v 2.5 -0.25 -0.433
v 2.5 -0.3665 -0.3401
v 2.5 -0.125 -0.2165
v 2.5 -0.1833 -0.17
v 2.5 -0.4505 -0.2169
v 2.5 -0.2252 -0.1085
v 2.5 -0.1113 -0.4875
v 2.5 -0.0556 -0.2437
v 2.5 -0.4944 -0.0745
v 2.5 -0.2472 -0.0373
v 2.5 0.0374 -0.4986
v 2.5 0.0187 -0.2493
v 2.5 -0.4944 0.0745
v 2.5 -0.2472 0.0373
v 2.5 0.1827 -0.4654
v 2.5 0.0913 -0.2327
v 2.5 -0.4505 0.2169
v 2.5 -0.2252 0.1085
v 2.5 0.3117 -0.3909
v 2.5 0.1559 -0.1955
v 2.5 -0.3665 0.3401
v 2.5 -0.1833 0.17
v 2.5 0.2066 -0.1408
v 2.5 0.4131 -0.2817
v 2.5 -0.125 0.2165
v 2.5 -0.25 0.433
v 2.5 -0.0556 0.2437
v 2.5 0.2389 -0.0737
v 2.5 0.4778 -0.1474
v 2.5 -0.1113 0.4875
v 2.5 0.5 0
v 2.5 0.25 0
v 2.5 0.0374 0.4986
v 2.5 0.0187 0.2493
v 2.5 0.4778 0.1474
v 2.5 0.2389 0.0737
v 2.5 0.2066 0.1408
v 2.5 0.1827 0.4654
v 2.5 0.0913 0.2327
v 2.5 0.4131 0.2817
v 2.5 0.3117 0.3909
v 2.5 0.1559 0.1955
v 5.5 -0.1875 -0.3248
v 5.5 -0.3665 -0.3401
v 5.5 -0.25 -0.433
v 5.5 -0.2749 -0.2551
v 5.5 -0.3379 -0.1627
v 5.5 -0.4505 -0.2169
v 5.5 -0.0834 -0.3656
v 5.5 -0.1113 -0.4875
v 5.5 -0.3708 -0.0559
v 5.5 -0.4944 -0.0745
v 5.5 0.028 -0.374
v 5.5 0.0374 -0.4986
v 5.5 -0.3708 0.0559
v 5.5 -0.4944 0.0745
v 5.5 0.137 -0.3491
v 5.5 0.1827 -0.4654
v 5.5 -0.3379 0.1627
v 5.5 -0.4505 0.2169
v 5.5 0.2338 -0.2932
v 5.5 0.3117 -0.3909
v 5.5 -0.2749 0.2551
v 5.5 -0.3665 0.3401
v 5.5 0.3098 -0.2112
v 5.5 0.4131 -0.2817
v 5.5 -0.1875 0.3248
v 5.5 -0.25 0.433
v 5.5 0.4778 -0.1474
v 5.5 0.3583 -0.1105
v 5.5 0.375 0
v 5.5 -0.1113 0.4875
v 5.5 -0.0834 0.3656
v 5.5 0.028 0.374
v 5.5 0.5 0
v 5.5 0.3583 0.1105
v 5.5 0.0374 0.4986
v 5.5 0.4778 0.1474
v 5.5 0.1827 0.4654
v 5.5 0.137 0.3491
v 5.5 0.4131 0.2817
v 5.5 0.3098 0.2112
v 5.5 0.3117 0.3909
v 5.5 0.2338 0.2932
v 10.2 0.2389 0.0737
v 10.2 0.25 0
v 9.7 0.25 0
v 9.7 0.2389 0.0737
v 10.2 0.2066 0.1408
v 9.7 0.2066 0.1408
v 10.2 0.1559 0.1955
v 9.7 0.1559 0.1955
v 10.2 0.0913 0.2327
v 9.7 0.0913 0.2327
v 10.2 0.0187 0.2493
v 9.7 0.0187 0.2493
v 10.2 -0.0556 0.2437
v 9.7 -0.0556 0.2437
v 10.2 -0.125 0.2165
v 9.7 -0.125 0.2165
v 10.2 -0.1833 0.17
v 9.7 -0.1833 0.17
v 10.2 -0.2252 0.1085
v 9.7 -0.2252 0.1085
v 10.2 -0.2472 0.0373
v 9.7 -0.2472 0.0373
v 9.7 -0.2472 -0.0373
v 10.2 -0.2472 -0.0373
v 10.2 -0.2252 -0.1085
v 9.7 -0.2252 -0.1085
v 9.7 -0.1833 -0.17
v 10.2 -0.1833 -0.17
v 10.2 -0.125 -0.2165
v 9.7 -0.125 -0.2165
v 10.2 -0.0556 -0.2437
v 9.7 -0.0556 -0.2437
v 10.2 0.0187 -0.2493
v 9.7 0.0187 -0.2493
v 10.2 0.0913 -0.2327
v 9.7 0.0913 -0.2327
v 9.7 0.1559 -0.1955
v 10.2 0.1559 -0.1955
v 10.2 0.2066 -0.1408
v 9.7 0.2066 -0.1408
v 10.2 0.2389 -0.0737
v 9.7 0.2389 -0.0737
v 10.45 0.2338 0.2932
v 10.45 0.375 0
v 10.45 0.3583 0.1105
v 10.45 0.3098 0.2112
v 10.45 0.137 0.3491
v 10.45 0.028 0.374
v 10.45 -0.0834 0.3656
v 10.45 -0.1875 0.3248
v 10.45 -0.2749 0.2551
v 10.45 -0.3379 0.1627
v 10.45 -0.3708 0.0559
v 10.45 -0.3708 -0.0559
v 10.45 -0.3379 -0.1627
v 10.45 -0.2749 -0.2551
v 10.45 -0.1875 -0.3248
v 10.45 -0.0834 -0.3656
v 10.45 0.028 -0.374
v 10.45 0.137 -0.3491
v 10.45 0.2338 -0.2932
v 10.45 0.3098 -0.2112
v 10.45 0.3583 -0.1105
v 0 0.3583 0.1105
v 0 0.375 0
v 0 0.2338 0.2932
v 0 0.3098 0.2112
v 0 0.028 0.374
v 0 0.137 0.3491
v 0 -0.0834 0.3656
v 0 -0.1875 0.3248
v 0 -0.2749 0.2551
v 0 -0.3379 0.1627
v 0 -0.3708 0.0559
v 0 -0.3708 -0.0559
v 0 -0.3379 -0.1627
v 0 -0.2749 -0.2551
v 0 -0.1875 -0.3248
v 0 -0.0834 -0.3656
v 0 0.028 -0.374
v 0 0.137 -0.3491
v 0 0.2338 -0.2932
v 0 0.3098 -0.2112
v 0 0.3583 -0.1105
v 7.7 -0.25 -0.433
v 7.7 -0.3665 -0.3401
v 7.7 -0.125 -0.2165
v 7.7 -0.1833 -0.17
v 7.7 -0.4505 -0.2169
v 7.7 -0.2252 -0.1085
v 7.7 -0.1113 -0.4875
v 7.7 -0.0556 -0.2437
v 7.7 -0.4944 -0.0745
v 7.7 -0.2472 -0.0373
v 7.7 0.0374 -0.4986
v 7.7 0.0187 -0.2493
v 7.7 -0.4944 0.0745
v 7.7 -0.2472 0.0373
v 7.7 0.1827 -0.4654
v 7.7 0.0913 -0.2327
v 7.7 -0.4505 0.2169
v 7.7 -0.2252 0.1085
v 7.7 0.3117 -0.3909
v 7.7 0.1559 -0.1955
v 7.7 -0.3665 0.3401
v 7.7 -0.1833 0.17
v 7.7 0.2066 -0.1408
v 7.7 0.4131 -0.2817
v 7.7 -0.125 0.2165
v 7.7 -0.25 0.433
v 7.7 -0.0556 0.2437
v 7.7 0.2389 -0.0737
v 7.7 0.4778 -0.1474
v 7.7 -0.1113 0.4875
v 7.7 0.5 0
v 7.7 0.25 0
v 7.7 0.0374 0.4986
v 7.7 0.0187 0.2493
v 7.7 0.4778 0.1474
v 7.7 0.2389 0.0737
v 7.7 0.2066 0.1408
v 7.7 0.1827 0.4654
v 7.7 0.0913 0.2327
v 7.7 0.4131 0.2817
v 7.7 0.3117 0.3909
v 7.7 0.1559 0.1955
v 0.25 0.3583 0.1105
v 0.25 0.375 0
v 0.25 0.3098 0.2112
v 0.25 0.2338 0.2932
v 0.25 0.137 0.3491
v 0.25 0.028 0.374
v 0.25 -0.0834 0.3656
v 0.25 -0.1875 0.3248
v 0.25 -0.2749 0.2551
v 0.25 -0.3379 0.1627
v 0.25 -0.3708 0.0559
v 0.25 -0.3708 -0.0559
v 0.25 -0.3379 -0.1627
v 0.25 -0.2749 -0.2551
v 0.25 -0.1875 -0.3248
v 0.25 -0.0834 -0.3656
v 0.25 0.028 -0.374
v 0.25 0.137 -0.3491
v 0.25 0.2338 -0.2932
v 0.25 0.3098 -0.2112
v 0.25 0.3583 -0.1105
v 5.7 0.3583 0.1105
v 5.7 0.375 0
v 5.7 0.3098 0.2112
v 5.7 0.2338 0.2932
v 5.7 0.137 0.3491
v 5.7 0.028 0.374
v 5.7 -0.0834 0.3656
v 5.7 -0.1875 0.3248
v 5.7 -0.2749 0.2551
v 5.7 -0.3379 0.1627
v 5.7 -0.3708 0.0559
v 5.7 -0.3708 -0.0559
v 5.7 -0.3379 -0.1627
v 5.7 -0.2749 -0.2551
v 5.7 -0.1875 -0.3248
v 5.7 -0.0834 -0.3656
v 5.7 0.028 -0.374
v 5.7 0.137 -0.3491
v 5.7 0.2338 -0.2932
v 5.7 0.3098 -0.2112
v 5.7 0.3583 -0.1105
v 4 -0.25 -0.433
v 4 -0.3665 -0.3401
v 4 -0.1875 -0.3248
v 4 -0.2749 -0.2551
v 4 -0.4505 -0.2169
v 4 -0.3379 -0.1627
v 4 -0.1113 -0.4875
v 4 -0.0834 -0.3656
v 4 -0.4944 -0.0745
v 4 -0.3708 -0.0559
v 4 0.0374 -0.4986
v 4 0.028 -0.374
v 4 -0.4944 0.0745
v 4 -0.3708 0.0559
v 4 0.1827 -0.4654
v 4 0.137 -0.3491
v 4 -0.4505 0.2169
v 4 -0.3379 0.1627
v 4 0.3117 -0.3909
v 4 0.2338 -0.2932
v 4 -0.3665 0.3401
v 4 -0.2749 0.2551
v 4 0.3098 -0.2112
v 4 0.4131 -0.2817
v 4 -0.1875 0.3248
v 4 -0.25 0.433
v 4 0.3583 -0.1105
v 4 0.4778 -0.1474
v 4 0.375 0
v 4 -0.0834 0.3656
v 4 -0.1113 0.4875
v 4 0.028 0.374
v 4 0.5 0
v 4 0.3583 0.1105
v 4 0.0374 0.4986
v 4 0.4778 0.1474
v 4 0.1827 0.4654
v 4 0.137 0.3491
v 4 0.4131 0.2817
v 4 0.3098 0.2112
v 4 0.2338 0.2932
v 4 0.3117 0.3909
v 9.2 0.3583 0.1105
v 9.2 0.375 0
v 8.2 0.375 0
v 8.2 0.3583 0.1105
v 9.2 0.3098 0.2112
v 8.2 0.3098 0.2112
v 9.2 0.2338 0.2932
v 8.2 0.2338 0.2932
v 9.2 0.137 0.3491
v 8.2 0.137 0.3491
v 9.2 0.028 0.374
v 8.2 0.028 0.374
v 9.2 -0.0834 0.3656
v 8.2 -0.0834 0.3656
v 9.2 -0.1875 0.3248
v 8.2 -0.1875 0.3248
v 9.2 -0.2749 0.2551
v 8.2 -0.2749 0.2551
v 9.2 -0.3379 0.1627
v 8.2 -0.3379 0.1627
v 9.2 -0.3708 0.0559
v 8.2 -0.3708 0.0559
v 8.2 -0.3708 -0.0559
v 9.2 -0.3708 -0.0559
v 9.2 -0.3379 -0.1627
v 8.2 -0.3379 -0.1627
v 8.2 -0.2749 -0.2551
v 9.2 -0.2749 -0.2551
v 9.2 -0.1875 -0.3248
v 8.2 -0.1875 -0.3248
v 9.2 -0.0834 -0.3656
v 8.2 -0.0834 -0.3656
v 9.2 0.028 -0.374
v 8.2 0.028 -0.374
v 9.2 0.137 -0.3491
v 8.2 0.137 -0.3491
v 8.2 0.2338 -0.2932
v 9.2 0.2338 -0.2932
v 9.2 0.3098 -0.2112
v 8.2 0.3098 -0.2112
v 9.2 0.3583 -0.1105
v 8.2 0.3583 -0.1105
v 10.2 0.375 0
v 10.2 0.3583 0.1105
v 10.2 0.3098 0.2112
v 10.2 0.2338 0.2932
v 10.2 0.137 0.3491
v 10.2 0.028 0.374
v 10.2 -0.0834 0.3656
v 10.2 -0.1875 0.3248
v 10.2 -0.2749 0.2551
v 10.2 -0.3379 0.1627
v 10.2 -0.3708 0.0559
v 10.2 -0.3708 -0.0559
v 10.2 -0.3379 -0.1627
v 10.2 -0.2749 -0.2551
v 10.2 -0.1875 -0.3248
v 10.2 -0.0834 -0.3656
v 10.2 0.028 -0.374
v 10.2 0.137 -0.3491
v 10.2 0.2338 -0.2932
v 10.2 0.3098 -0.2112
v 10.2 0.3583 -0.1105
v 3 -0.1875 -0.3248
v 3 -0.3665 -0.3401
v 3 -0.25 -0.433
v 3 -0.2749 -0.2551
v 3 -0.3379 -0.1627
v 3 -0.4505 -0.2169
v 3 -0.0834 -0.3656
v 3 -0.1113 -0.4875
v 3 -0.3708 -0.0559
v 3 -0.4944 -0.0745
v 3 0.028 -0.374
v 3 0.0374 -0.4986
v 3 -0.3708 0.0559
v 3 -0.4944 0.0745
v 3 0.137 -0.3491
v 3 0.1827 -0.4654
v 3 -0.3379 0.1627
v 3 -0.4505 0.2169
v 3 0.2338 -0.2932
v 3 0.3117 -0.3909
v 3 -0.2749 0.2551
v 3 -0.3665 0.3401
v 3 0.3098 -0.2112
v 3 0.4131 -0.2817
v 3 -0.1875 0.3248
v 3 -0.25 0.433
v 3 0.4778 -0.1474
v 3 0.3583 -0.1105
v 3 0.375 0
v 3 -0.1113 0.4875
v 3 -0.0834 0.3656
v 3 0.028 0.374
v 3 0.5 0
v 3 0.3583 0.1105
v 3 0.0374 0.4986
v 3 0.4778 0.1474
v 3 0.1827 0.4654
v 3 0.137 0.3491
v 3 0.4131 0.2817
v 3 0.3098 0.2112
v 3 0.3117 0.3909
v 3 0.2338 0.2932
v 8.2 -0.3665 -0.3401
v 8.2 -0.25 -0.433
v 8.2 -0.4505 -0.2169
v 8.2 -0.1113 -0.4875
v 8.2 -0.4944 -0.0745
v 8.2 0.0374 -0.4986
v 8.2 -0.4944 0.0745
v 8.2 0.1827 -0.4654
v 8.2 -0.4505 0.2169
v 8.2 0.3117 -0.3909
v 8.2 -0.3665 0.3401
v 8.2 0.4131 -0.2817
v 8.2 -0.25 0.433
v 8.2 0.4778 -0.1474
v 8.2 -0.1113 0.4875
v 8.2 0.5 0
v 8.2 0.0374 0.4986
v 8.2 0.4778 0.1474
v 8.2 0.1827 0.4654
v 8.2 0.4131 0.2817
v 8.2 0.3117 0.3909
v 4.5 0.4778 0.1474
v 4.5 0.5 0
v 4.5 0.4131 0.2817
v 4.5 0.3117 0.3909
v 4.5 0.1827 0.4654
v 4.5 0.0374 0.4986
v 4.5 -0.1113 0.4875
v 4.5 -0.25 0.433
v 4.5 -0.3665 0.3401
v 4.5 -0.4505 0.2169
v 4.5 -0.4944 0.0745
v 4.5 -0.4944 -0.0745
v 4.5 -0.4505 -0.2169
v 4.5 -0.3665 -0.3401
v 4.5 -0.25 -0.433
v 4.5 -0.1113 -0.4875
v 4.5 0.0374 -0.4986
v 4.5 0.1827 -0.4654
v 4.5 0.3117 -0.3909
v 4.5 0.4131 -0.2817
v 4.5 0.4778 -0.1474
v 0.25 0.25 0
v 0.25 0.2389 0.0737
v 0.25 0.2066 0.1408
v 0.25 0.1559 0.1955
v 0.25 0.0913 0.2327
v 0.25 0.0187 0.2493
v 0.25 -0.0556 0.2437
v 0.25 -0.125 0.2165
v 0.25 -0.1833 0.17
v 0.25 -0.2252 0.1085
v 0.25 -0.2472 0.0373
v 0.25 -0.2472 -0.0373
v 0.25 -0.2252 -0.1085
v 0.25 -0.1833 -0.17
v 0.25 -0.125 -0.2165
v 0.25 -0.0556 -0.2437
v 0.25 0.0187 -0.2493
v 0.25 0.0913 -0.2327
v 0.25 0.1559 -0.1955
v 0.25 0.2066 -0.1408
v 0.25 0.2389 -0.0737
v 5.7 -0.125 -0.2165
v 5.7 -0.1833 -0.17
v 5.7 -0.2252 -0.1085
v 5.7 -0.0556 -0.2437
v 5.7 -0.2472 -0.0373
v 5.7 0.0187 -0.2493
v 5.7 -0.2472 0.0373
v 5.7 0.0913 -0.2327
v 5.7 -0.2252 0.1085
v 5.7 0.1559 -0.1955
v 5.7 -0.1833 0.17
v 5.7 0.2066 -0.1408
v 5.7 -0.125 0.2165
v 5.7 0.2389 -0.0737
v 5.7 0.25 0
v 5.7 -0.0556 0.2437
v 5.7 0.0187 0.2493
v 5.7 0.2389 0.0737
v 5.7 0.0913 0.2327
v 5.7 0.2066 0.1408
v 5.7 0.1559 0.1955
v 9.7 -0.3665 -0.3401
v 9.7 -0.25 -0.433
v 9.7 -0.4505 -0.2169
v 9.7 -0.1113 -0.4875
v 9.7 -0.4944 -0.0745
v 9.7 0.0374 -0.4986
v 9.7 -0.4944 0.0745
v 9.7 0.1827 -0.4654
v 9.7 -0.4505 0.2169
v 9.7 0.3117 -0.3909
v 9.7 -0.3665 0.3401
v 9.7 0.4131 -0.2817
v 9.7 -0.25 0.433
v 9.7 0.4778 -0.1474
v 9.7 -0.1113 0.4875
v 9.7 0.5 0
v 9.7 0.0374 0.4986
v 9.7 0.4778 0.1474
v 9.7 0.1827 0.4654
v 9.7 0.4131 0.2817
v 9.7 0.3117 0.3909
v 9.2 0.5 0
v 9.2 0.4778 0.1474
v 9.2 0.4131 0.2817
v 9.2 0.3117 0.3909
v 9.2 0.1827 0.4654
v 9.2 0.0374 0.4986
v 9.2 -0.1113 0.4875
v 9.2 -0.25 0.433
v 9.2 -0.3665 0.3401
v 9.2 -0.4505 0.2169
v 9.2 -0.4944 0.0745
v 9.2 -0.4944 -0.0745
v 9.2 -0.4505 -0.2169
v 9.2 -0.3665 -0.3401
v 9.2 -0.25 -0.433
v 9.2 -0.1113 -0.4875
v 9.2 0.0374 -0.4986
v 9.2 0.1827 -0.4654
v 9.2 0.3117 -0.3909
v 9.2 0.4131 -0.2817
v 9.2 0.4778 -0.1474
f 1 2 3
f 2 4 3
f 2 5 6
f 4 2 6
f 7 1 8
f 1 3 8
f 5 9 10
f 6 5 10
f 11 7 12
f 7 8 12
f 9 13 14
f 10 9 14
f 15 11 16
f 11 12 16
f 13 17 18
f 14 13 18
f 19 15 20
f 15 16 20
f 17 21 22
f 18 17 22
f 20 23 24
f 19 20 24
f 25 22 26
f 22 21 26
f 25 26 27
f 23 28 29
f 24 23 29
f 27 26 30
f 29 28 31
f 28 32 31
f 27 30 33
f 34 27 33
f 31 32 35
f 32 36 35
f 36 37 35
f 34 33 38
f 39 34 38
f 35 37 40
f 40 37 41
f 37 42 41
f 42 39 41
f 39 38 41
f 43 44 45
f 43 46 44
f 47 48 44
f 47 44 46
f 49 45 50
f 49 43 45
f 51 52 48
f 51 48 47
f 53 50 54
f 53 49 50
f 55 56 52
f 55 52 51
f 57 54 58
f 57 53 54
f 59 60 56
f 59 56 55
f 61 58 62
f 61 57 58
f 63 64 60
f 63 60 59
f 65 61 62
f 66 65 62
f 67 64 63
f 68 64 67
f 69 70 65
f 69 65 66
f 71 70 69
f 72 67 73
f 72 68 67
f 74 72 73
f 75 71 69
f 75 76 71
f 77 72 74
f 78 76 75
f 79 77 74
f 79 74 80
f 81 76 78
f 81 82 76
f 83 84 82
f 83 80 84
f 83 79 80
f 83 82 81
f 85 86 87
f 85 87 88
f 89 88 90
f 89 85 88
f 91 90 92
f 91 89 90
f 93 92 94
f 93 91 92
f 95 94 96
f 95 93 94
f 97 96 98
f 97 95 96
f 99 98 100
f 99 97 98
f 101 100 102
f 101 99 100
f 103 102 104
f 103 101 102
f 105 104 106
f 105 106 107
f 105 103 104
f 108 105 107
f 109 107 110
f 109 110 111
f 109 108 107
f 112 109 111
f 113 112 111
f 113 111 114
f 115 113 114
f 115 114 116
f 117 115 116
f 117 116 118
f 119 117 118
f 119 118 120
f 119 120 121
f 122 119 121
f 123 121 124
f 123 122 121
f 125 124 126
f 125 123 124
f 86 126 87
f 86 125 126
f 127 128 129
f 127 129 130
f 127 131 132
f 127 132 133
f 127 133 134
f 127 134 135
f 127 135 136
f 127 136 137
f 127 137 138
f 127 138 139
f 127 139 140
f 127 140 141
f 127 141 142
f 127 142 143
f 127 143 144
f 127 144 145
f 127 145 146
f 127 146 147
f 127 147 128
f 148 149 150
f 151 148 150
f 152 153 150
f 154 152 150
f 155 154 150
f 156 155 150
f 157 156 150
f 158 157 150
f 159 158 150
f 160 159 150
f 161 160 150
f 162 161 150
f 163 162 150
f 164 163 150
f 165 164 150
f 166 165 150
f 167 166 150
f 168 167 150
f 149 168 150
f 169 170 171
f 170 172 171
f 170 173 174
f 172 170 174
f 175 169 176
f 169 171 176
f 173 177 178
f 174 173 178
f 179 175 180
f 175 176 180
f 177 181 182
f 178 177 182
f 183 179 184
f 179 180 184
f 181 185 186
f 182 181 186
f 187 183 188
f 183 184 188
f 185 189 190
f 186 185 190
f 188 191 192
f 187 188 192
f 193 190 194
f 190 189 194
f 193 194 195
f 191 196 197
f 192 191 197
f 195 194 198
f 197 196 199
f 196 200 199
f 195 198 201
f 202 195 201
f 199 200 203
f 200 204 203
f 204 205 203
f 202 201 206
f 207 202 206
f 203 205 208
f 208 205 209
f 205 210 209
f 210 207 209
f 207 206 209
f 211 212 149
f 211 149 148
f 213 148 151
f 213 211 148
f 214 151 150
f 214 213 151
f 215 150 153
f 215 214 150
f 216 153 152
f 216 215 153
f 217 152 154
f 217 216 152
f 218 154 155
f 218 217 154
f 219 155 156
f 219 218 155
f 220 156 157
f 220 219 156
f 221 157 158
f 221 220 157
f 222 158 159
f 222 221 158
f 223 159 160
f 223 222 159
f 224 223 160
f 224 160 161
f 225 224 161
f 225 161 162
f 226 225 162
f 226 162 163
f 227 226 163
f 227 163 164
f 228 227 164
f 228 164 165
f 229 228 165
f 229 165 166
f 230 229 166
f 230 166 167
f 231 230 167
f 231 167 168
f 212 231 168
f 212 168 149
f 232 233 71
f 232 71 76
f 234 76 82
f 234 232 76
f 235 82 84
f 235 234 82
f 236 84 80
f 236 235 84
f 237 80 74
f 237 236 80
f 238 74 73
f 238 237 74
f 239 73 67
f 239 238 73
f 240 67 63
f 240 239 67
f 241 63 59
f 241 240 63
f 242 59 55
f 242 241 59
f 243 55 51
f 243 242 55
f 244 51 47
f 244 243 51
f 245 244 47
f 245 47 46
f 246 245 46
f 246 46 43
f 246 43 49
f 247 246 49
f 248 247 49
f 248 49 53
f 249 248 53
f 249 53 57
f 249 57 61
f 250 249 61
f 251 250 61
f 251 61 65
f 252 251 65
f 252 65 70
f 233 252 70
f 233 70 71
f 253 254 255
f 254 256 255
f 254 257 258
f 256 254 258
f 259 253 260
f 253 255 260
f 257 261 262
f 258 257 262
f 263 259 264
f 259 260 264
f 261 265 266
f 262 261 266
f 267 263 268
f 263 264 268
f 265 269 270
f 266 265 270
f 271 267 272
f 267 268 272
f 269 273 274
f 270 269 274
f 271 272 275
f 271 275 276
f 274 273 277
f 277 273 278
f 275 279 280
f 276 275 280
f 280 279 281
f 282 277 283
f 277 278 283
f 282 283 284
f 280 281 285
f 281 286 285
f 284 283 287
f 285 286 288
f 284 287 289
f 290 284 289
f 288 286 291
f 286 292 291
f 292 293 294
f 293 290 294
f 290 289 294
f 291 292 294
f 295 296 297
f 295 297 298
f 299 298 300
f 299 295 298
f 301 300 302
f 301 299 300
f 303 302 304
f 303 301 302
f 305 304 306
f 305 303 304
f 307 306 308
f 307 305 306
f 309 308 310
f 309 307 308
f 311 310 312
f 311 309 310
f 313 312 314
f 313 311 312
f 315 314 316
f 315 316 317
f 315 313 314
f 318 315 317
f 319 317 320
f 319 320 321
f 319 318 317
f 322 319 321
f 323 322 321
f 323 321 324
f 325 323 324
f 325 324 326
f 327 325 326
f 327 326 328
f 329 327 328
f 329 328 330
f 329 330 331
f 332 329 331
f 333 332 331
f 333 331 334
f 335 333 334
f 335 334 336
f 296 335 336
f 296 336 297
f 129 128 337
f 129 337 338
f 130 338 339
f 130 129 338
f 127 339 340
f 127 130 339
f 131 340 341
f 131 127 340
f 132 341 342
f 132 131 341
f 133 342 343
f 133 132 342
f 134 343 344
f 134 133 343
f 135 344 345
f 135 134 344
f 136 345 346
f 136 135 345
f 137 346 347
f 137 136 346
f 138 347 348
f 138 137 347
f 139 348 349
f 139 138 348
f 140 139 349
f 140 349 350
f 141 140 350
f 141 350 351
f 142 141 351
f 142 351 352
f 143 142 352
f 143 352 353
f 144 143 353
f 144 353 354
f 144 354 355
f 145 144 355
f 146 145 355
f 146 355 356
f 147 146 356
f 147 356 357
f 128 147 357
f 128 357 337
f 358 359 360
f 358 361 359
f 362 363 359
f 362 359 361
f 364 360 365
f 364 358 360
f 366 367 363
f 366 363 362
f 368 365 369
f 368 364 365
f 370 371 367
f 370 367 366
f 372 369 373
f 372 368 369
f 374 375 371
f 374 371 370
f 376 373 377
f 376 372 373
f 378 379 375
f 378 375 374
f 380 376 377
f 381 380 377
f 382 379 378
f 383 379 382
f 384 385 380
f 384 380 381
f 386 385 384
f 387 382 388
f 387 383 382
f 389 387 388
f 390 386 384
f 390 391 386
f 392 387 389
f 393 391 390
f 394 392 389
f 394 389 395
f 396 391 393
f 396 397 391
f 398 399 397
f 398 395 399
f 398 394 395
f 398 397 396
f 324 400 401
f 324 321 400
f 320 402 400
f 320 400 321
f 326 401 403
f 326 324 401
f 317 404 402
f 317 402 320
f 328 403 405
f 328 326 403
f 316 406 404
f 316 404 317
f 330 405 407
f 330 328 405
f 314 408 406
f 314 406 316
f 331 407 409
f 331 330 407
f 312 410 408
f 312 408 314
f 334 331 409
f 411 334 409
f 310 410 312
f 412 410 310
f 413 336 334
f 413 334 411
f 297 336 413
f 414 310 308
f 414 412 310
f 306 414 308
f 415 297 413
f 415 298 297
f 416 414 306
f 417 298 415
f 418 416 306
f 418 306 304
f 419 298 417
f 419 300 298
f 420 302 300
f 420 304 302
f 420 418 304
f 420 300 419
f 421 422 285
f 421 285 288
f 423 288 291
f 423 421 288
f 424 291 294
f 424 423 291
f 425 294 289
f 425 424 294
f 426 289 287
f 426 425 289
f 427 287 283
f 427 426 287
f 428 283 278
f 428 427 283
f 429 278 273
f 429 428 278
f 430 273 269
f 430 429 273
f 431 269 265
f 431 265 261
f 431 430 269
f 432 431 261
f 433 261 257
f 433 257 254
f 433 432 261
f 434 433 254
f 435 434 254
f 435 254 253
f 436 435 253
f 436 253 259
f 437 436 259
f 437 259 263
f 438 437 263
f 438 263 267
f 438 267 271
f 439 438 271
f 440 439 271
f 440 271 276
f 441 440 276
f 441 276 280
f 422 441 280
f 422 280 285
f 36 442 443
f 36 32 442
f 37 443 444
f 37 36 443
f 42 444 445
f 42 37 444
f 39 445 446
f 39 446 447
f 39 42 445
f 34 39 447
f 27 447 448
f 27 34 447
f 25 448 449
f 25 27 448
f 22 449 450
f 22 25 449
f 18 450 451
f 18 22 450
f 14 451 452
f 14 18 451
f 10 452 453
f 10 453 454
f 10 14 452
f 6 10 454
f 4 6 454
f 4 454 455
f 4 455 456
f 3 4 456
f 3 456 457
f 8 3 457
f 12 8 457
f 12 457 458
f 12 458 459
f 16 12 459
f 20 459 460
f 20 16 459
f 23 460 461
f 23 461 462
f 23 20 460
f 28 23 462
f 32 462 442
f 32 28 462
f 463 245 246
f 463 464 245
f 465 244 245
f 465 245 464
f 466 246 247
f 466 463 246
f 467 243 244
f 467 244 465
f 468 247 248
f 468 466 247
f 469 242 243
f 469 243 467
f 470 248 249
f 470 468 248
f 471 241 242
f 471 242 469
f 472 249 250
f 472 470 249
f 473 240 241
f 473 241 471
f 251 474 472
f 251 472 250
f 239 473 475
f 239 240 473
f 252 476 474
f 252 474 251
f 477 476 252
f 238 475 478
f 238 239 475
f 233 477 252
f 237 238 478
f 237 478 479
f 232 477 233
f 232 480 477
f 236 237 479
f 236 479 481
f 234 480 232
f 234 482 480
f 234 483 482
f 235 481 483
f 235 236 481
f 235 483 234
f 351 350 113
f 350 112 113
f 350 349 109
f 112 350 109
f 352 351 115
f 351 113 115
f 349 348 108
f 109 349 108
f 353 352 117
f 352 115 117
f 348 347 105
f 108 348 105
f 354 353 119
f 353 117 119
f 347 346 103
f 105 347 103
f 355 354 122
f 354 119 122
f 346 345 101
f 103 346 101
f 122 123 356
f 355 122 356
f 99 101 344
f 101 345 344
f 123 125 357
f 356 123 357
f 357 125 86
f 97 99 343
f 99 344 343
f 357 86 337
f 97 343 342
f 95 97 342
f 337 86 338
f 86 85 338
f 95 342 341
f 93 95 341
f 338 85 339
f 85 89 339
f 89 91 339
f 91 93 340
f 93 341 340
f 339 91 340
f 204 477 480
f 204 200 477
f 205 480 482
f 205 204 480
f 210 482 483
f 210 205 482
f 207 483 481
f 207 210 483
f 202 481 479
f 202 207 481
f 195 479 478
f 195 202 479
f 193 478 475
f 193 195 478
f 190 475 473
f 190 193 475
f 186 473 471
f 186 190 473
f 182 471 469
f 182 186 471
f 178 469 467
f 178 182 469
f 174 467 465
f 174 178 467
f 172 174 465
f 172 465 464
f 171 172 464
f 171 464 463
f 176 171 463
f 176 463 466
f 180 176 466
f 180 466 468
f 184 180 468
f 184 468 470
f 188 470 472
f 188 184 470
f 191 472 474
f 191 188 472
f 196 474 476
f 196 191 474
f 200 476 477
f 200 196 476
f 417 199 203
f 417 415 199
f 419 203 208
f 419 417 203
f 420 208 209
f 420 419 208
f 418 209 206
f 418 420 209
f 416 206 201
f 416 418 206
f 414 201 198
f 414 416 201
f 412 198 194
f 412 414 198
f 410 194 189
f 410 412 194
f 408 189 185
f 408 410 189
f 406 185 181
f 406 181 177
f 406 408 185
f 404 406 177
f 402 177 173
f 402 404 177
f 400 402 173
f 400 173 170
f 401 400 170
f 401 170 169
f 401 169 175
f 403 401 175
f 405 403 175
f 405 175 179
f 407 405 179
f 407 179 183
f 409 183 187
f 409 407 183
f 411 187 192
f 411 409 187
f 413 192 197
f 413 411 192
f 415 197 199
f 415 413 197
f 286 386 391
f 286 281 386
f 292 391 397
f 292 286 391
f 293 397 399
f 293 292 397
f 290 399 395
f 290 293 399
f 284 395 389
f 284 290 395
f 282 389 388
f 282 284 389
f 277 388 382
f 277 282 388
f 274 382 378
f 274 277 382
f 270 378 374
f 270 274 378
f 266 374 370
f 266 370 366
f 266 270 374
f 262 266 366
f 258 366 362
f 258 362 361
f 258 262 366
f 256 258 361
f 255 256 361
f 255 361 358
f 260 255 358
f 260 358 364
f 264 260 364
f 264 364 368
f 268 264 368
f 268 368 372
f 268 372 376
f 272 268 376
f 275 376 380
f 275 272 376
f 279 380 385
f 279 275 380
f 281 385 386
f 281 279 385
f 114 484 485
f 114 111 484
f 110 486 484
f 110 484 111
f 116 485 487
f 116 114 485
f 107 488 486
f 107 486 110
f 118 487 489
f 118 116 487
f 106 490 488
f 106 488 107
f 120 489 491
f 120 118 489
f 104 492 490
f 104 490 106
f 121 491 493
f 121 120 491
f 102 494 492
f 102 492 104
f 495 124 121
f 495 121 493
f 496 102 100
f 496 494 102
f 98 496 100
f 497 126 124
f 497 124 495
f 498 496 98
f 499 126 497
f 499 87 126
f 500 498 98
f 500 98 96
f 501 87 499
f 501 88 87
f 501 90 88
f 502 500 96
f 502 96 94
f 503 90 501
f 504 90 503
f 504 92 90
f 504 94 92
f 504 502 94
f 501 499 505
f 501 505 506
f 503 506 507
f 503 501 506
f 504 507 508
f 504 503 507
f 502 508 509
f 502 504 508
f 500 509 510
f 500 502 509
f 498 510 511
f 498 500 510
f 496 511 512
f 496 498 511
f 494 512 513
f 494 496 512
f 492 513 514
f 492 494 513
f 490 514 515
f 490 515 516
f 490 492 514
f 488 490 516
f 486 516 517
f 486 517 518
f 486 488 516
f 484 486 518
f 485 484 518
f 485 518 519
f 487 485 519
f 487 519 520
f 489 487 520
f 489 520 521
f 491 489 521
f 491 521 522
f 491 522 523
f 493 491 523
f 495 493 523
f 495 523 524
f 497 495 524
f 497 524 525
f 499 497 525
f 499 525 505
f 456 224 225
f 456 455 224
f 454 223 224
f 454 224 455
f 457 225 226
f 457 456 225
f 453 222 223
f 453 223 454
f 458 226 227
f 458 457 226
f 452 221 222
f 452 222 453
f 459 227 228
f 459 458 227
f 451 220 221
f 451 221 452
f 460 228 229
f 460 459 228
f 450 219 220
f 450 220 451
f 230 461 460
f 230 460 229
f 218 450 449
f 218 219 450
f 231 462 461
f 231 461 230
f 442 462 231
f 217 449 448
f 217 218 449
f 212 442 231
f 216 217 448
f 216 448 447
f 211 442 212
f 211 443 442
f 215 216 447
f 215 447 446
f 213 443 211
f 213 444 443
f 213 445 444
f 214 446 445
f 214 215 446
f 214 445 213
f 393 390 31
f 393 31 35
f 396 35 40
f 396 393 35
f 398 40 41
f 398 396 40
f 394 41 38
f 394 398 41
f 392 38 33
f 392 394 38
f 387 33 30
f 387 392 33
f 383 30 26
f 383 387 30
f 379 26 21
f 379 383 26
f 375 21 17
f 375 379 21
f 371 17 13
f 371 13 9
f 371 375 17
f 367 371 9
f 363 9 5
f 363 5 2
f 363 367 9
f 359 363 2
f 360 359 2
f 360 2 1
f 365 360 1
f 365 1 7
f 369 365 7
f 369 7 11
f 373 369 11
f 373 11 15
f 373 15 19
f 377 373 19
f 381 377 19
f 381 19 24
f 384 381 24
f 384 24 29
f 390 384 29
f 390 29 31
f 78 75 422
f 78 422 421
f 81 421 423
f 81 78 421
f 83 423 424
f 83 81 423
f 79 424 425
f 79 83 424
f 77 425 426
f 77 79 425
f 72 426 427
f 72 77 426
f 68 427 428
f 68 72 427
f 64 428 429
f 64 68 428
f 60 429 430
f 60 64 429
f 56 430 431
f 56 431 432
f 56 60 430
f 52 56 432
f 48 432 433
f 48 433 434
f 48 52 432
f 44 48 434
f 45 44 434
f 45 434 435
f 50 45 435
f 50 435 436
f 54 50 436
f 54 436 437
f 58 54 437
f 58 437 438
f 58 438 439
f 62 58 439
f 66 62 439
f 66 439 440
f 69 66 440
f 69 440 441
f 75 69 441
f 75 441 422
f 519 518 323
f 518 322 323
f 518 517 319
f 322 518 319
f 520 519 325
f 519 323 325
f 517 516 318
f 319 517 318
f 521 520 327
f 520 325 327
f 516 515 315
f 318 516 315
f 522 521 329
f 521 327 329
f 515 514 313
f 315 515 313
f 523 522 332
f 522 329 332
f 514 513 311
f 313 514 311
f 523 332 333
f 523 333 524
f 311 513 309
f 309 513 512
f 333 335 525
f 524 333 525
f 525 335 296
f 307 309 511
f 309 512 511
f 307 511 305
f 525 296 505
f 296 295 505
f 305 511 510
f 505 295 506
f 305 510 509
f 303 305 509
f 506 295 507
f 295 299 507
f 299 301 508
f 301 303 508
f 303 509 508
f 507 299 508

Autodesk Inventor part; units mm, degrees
ref_plane "Start Plane" through (0, 0, 0) normal (1, 0, 0) x (0, 1, 0)
ref_plane "XZ Plane" through (0, 0, 0) normal (0, 1, 0) x (-1, 0, 0)
ref_plane "XY Plane" through (0, 0, 0) normal (0, 0, 1) x (1, 0, 0)
sketch "Main Sketch" plane through (0, 0, 0) normal (0, 0, 1) x (1, 0, 0)
  line L0 (0, 0) -> (10.45, 0)
  line L1 (0, 0) -> (0, 0.375)
  line L2 (0, 0.375) -> (0.25, 0.375)
  line L3 (4.5, 0.5) -> (5.5, 0.5)
  line L4 (5.5, 0.375) -> (5.7, 0.375)
  line L5 (5.7, 0.25) -> (7.7, 0.25)
  line L6 (7.7, 0.5) -> (8.2, 0.5)
  line L7 (9.7, 0.25) -> (10.2, 0.25)
  line L8 (10.45, 0.375) -> (10.45, 0)
  line L9 (10.2, 0.375) -> (10.45, 0.375)
  line L10 (10.2, 0.25) -> (10.2, 0.375)
  line L11 (7.7, 0.25) -> (7.7, 0.5)
  line L12 (8.2, 0.5) -> (8.2, 0.375)
  line L13 (5.5, 0.5) -> (5.5, 0.375)
  line L14 (5.7, 0.375) -> (5.7, 0.25)
  line L15 (2.5, 0.25) -> (2.5, 0.5)
  line L16 (2.5, 0.5) -> (3, 0.5)
  line L17 (0.25, 0.375) -> (0.25, 0.25)
  line L18 (0.25, 0.25) -> (2.5, 0.25)
  line L19 (8.2, 0.375) -> (9.2, 0.375)
  line L20 (9.2, 0.375) -> (9.2, 0.5)
  line L21 (9.7, 0.5) -> (9.7, 0.25)
  line L22 (9.2, 0.5) -> (9.7, 0.5)
  line L23 (3, 0.5) -> (3, 0.375)
  line L24 (3, 0.375) -> (4, 0.375)
  line L25 (4, 0.375) -> (4, 0.5)
  line L26 (4, 0.5) -> (4.5, 0.5)
  dimension "d3" = 0.75
  dimension "d4" = 1
  dimension "d5" = 0.75
  dimension "d6" = 0.5
  dimension "d7" = 1
  dimension "d8" = 0.5
  dimension "d9" = 0.75
  dimension "d13" = 1
  dimension "d14" = 0.5
  dimension "d15" = 0.75
  dimension "d16" = 1
  dimension "d17" = 0.75
  dimension "d18" = 1
revolve "Revolution1" add sketch "Main Sketch" angle 360 about axis through (0, 0, 0) along (1, 0, 0)
fillet "Fillet2" [suppressed]
equation "\"Length\" = 10.45"
properties part number "Shaft" material "Steel"
